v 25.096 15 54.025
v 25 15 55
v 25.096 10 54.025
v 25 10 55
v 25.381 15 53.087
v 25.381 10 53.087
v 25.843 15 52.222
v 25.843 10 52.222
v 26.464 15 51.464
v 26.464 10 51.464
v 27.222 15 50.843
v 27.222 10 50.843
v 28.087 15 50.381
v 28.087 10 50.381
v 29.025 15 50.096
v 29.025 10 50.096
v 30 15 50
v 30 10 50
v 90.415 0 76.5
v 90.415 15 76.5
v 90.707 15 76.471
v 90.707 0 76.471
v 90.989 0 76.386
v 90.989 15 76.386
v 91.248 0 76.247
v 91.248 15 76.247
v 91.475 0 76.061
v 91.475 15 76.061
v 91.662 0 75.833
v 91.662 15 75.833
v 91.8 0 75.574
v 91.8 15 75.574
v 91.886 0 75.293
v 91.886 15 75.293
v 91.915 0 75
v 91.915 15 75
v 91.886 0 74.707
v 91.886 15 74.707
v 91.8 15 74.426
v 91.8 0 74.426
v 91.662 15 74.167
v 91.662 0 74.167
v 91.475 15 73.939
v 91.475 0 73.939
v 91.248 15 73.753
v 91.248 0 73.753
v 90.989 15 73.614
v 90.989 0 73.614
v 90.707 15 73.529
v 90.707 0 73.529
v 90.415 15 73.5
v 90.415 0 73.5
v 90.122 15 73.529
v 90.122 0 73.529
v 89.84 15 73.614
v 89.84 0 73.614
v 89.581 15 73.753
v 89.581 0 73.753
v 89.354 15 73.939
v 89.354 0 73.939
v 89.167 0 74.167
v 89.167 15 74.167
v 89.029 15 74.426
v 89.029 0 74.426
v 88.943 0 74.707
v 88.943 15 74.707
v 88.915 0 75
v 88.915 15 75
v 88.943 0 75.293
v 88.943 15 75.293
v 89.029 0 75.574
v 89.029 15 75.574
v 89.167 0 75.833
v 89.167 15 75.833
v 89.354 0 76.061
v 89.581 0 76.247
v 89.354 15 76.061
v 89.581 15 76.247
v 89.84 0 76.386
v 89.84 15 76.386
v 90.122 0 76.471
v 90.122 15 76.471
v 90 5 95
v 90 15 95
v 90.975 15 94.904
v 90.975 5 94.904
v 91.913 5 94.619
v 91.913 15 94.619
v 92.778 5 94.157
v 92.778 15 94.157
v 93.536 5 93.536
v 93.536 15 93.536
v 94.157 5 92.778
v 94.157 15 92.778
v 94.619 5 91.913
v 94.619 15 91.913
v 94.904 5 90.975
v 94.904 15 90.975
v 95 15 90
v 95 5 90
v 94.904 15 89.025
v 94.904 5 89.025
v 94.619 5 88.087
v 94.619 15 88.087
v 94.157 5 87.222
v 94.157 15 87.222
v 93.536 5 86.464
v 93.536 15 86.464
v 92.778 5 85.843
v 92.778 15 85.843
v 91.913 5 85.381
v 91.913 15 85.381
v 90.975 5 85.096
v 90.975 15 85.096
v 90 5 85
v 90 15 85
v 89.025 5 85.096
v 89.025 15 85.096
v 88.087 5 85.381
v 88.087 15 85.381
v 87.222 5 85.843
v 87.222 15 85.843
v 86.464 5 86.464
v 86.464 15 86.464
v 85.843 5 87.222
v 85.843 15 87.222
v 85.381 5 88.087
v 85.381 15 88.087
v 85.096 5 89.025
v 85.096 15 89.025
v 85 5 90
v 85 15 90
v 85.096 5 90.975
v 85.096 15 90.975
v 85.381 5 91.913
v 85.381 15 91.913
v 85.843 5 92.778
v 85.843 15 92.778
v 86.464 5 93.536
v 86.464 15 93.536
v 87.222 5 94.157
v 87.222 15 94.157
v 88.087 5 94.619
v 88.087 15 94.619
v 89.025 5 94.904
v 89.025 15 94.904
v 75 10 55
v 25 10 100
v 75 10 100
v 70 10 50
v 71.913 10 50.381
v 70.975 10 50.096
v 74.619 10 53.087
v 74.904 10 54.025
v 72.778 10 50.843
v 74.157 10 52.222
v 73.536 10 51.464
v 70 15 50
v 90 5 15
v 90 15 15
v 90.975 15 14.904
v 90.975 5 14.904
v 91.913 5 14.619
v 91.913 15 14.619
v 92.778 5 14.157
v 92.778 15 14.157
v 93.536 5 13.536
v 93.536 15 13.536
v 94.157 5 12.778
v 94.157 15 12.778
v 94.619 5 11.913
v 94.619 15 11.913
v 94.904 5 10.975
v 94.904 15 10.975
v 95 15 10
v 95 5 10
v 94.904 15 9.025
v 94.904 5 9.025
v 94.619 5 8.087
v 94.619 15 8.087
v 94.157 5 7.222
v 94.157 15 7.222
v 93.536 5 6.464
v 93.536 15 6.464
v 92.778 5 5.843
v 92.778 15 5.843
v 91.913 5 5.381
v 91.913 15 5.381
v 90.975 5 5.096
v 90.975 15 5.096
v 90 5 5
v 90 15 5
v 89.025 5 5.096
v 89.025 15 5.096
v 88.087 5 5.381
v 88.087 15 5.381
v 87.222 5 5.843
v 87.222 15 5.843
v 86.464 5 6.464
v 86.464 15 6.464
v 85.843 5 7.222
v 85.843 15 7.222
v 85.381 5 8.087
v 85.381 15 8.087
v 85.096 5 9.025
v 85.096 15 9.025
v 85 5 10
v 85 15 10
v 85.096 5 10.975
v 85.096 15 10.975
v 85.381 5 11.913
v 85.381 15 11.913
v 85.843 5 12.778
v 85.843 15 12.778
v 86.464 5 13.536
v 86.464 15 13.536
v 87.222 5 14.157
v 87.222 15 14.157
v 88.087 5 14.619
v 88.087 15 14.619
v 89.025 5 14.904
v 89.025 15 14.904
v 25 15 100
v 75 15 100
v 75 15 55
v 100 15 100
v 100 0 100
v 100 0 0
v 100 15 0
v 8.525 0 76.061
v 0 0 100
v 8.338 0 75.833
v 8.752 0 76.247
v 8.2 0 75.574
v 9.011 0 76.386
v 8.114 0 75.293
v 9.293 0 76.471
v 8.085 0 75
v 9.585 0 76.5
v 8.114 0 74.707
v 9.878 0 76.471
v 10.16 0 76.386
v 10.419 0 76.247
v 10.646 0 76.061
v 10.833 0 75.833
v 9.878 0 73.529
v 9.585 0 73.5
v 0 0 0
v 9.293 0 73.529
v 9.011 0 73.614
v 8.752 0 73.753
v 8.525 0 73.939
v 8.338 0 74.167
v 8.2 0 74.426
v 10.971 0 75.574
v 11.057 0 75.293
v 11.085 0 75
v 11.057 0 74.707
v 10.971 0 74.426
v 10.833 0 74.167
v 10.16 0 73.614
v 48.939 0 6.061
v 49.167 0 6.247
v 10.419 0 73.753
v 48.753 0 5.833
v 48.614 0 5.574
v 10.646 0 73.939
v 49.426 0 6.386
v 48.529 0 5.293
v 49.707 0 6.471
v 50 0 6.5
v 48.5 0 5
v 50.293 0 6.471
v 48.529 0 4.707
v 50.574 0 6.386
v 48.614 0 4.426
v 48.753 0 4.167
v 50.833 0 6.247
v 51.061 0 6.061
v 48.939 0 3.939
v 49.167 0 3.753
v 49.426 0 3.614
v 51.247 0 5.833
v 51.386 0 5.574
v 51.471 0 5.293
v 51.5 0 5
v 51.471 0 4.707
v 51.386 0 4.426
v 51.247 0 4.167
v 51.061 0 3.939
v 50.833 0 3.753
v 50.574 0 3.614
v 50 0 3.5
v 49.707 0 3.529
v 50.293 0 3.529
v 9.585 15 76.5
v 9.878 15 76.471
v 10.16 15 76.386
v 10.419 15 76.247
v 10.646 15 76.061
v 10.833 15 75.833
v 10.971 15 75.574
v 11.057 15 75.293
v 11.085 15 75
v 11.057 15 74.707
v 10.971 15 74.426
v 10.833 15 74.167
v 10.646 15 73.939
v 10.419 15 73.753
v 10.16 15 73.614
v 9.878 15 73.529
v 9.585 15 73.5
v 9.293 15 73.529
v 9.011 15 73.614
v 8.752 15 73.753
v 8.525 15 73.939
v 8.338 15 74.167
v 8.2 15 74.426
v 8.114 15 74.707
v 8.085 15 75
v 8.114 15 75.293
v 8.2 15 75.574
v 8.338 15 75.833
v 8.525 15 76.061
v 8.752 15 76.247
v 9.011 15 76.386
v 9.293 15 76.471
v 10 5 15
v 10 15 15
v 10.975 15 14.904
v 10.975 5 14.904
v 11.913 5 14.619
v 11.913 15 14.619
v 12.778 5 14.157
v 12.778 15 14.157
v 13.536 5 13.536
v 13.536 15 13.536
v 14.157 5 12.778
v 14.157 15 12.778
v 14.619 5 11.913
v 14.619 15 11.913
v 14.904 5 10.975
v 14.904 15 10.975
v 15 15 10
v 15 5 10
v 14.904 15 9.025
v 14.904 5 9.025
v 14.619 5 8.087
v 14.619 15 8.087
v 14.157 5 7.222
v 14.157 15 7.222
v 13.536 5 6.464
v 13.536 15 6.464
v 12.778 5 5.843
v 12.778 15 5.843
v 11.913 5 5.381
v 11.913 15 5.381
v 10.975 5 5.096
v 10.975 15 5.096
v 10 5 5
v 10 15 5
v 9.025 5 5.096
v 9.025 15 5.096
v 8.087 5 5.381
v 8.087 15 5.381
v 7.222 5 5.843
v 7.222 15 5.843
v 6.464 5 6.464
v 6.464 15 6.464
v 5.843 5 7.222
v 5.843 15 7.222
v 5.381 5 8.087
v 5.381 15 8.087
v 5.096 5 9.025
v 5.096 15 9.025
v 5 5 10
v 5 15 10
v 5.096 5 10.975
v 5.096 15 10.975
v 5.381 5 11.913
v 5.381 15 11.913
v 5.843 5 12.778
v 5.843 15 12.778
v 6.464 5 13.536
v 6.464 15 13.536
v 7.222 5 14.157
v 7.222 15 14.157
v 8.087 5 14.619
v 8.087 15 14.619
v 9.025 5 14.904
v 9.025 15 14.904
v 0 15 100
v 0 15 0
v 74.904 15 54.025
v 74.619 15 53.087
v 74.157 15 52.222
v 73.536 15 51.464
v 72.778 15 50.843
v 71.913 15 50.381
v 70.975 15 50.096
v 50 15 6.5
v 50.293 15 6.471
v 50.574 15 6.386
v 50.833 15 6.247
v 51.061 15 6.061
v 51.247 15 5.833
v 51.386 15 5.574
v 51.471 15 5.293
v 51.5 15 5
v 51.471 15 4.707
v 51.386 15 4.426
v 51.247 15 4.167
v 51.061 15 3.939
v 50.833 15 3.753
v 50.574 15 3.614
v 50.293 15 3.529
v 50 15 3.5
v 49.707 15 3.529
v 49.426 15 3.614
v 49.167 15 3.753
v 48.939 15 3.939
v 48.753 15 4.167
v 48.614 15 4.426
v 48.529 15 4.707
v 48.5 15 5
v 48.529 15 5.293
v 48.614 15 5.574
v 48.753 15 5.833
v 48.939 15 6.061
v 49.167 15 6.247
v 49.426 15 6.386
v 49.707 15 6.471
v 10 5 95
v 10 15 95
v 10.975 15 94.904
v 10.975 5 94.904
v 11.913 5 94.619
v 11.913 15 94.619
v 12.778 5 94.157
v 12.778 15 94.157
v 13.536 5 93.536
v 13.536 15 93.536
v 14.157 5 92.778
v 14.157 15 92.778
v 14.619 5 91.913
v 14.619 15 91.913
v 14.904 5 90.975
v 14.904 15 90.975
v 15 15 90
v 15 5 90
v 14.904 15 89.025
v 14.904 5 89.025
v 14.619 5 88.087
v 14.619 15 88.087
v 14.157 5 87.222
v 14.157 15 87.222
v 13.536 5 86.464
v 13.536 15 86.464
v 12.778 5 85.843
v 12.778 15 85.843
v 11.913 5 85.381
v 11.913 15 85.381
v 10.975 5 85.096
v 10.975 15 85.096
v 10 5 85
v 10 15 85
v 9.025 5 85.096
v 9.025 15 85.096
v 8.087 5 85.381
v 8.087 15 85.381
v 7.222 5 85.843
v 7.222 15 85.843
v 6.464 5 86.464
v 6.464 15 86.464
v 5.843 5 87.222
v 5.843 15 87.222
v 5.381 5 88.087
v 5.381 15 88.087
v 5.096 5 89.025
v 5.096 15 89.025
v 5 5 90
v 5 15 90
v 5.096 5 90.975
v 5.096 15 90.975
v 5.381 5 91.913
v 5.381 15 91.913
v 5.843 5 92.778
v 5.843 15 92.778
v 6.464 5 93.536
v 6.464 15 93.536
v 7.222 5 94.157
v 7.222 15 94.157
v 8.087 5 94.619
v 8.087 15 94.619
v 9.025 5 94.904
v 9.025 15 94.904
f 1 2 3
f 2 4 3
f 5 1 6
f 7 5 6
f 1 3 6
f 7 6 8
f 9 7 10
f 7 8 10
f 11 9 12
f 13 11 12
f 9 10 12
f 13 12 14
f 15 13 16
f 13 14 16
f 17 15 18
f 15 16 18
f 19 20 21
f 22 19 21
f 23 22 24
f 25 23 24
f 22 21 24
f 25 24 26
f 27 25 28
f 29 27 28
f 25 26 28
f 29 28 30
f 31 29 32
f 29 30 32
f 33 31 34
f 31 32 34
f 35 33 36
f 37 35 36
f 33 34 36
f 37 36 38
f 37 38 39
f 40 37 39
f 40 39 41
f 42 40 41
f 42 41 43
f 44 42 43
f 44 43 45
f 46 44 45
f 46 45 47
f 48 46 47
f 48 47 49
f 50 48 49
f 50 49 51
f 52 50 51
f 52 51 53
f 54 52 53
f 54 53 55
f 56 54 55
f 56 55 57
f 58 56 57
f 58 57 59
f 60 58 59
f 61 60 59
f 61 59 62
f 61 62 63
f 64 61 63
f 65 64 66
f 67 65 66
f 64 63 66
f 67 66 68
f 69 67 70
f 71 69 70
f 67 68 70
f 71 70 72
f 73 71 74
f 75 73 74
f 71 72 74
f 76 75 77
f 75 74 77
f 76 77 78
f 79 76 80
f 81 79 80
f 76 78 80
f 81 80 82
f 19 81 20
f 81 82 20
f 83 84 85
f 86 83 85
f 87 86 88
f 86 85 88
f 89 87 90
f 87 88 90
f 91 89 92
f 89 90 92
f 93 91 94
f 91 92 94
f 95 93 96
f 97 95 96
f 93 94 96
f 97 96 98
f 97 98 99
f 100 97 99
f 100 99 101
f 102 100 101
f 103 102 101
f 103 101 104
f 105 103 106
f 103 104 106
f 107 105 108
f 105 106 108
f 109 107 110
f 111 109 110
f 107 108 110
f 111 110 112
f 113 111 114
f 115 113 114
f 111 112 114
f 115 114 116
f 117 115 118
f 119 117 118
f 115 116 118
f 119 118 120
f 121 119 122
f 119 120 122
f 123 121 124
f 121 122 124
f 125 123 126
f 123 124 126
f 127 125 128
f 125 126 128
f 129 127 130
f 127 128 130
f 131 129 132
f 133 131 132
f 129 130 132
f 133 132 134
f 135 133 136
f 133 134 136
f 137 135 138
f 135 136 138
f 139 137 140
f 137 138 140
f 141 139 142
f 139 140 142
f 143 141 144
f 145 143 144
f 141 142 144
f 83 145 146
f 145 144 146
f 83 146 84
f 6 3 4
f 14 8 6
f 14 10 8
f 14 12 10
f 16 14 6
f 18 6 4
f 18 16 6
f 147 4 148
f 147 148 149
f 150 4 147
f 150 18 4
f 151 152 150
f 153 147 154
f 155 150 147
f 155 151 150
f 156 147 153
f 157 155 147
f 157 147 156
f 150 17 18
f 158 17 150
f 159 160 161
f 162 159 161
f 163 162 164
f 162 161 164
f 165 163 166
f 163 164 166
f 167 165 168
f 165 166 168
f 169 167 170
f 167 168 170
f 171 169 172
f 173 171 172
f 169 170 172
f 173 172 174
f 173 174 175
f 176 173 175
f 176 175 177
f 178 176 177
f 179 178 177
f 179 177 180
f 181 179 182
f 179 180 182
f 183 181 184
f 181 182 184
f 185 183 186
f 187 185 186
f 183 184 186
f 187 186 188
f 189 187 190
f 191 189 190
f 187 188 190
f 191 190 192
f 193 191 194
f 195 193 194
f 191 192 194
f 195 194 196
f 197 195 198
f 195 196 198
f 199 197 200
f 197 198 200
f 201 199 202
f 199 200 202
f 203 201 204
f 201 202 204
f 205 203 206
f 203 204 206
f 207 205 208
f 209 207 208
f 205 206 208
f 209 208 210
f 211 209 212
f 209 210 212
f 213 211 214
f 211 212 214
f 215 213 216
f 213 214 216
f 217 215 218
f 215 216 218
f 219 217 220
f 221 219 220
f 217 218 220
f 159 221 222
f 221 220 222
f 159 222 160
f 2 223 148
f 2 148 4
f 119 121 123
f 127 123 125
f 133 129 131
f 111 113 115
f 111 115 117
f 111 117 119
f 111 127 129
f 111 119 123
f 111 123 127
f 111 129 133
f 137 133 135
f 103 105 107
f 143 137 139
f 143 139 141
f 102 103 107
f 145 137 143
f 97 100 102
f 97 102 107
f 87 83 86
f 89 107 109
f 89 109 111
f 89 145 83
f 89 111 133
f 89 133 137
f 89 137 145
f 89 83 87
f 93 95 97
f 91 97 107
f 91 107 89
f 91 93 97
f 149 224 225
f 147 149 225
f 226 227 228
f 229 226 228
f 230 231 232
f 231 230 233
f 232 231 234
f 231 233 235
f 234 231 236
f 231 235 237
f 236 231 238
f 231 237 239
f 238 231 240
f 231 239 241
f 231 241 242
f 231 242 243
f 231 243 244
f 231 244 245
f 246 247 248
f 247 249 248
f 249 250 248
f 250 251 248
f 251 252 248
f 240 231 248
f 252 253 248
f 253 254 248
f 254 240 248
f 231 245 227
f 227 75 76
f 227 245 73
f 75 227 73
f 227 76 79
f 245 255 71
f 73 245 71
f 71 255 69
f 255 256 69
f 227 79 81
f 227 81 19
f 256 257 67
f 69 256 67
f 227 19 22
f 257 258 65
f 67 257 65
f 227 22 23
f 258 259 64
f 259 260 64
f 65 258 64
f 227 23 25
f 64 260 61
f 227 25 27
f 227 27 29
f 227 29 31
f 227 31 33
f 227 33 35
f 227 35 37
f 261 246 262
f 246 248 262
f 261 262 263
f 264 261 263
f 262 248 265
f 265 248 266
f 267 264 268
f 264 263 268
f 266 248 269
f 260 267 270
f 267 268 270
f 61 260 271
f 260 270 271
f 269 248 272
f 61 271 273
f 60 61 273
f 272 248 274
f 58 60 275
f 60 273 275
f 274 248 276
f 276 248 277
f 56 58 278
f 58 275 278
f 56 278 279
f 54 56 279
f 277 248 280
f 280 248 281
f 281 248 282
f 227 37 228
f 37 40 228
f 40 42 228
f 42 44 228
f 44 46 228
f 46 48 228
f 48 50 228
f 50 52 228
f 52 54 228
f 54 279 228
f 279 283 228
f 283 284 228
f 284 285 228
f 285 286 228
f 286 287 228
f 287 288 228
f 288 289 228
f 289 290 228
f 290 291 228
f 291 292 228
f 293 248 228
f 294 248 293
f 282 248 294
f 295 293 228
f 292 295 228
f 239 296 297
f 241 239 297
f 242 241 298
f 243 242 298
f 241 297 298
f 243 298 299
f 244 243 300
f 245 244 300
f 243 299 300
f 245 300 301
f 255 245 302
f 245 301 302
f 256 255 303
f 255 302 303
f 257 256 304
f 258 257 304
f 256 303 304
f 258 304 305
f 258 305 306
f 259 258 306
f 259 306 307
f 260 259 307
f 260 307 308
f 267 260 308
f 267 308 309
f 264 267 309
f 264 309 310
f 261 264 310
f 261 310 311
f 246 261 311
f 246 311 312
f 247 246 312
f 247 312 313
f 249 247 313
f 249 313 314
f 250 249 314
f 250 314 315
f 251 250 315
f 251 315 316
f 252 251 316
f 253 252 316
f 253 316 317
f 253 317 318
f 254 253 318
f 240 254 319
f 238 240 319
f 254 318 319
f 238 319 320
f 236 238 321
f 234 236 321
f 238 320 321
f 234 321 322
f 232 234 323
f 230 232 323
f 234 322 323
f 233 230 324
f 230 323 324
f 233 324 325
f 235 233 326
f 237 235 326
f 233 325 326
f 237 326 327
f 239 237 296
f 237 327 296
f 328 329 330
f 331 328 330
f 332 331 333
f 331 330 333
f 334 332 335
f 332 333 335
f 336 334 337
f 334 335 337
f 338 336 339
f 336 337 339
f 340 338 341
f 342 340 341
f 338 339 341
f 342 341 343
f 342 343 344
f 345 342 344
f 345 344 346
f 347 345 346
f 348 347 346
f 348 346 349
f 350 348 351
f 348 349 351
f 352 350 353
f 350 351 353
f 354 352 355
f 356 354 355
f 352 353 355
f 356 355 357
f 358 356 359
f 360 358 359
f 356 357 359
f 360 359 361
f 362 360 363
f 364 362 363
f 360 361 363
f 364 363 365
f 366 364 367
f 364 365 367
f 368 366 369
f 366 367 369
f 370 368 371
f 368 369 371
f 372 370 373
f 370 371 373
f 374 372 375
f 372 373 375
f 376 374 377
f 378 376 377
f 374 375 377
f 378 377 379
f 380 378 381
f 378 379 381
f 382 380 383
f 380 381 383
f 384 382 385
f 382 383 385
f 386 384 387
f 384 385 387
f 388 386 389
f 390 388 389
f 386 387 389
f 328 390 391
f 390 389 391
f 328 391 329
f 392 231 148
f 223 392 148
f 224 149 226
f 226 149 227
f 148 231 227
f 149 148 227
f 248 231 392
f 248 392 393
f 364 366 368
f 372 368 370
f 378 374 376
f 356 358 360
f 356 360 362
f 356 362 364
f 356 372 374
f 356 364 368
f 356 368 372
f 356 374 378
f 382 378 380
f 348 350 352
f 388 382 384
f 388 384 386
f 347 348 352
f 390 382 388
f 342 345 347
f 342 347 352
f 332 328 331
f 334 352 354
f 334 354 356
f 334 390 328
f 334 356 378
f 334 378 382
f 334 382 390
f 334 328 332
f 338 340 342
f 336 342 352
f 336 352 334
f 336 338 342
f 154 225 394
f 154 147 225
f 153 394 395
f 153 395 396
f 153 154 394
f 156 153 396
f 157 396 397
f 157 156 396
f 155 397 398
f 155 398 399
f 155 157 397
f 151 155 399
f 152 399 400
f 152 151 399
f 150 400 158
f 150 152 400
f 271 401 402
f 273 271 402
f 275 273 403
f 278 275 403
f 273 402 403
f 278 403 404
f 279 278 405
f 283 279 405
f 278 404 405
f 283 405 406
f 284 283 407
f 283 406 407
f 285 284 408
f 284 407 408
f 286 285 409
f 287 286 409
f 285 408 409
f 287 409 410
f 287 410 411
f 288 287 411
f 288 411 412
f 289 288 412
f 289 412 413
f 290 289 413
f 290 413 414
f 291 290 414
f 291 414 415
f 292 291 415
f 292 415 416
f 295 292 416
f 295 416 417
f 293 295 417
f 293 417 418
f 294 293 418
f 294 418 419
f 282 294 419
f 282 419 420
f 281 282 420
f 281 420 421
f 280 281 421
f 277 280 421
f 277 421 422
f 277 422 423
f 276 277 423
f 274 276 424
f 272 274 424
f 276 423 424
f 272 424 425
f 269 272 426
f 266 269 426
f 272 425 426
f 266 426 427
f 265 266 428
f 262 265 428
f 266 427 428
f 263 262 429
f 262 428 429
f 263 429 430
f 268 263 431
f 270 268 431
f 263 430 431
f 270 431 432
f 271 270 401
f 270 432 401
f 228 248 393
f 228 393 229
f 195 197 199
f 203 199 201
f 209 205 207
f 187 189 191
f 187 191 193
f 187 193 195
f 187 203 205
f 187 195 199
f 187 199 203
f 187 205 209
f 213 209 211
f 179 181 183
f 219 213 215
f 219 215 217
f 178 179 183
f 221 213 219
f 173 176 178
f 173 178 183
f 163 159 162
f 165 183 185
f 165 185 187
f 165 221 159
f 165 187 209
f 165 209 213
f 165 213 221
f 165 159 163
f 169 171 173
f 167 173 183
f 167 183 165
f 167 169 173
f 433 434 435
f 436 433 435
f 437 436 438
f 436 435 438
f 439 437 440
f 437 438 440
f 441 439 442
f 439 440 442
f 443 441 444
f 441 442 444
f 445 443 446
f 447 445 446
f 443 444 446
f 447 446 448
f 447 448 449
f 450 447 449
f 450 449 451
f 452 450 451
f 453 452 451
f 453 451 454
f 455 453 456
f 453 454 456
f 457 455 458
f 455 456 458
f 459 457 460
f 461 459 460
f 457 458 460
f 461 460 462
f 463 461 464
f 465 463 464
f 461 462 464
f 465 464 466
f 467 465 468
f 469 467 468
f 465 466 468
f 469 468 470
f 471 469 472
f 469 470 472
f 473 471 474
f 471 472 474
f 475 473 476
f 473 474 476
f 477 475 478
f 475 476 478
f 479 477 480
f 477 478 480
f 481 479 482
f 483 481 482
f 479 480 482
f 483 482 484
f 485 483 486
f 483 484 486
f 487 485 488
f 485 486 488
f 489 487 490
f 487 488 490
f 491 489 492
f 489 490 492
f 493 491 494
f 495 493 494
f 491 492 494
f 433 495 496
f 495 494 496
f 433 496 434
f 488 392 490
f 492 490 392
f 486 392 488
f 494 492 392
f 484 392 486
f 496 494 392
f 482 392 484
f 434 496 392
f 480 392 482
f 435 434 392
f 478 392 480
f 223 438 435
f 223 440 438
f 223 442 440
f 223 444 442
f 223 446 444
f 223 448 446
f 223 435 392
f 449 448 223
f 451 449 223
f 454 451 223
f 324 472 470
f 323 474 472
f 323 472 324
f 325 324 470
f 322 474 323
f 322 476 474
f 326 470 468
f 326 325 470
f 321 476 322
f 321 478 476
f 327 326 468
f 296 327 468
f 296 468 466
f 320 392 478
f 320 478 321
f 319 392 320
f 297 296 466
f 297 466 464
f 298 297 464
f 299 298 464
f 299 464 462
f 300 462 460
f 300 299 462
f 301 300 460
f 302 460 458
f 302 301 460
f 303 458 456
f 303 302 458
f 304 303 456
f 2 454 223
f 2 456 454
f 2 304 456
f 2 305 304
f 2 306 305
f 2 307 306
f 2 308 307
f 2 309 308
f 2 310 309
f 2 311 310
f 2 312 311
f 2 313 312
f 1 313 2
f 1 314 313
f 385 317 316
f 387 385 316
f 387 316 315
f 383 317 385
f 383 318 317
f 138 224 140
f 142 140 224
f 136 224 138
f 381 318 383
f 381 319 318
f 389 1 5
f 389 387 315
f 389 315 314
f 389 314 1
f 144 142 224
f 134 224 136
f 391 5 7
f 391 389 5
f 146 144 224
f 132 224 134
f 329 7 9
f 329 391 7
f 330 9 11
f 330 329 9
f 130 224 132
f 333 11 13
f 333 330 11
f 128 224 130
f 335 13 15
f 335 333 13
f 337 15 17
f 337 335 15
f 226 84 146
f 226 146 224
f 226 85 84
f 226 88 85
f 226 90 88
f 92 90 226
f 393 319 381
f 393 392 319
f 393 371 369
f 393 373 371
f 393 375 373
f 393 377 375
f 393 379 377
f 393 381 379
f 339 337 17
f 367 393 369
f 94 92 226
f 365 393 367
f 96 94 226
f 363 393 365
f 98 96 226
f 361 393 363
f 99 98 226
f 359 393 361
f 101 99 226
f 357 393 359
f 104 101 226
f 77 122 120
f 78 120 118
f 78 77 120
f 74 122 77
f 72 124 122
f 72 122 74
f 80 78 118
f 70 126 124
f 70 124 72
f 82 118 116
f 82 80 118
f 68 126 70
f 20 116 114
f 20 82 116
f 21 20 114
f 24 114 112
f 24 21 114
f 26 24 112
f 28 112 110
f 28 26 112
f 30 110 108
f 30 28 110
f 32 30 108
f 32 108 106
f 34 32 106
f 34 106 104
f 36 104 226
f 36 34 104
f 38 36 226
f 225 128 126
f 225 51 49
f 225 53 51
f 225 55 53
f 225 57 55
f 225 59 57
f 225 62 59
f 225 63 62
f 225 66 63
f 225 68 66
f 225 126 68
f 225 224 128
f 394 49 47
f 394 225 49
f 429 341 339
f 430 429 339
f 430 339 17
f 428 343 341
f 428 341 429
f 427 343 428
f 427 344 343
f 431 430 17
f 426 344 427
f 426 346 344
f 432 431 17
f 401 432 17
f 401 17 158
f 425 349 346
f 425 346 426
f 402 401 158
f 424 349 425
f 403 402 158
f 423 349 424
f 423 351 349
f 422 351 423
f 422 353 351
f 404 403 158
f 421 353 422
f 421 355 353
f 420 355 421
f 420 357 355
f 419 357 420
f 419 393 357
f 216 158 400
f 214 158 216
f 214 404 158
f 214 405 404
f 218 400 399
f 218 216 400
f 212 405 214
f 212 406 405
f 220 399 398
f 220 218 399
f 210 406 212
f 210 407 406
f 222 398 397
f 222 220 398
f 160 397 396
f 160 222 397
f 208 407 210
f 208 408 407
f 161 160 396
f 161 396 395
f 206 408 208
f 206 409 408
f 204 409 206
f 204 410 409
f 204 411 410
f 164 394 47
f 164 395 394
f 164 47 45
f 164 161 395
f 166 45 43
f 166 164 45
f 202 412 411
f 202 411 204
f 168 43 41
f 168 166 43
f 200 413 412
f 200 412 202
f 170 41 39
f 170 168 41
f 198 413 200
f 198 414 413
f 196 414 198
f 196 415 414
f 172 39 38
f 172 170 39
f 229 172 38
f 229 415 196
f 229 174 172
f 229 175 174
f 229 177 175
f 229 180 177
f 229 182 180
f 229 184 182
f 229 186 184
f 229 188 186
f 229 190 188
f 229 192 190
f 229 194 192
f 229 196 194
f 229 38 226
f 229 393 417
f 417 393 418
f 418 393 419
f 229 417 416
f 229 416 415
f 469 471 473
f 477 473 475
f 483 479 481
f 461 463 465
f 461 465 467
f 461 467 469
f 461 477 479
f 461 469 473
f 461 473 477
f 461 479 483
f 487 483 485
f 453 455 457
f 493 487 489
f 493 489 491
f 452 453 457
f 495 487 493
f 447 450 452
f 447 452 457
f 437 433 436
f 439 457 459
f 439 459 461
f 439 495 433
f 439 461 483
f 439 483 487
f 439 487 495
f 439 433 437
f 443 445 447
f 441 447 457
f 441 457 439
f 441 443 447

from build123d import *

# Parameters (mm, degrees)
SKETCH_1_W          = 100
SKETCH_1_H          = 100
EXTRUDE_1_DEPTH     = 15
SKETCH_2_R          = 1.5
CUT_EXTRUDE_1_DEPTH = 143.214626533
SKETCH_3_W          = 50
SKETCH_3_H          = 50
CUT_EXTRUDE_2_DEPTH = 5
SKETCH_4_R          = 5
CUT_EXTRUDE_3_DEPTH = 10
FILLET_1_R          = 5


with BuildPart() as part:
    # 草图1 → 凸台-拉伸1 (new body)
    with BuildSketch(Plane(origin=(0, 0, 0), x_dir=(1, 0, 0), z_dir=(0, 1, 0))):
        with Locations((50, -50)):
            Rectangle(SKETCH_1_W, SKETCH_1_H)
    extrude(amount=EXTRUDE_1_DEPTH)

    # 草图2 → 切除-拉伸1 (cut, through all)
    with BuildSketch(Plane(origin=(0, 15, 0), x_dir=(1, 0, 0), z_dir=(0, 1, 0))):
        with Locations(Location((50, -5, 0), (0, 0, 270))):
            Circle(SKETCH_2_R)
        with Locations(Location((9.585481157, -75, 0), (0, 0, 270))):
            Circle(SKETCH_2_R)
        with Locations(Location((90.414518843, -75, 0), (0, 0, 270))):
            Circle(SKETCH_2_R)
    extrude(amount=-CUT_EXTRUDE_1_DEPTH, mode=Mode.SUBTRACT)

    # 草图3 → 切除-拉伸2 (cut)
    with BuildSketch(Plane(origin=(0, 15, 0), x_dir=(1, 0, 0), z_dir=(0, 1, 0))):
        with Locations((50, -75)):
            Rectangle(SKETCH_3_W, SKETCH_3_H)
    extrude(amount=-CUT_EXTRUDE_2_DEPTH, mode=Mode.SUBTRACT)

    # 草图4 → 切除-拉伸3 (cut)
    with BuildSketch(Plane(origin=(0, 15, 0), x_dir=(1, 0, 0), z_dir=(0, 1, 0))):
        with Locations(Location((10, -10, 0), (0, 0, 270))):
            Circle(SKETCH_4_R)
        with Locations(Location((90, -10, 0), (0, 0, 270))):
            Circle(SKETCH_4_R)
        with Locations(Location((10, -90, 0), (0, 0, 270))):
            Circle(SKETCH_4_R)
        with Locations(Location((90, -90, 0), (0, 0, 270))):
            Circle(SKETCH_4_R)
    extrude(amount=-CUT_EXTRUDE_3_DEPTH, mode=Mode.SUBTRACT)

    # 圆角1
    fillet_1_edges = [part.edges().sort_by_distance(p)[0] for p in [
        (25, 12.5, 50),
        (75, 12.5, 50),
    ]]
    fillet(fillet_1_edges, radius=FILLET_1_R)


solid = part.part
